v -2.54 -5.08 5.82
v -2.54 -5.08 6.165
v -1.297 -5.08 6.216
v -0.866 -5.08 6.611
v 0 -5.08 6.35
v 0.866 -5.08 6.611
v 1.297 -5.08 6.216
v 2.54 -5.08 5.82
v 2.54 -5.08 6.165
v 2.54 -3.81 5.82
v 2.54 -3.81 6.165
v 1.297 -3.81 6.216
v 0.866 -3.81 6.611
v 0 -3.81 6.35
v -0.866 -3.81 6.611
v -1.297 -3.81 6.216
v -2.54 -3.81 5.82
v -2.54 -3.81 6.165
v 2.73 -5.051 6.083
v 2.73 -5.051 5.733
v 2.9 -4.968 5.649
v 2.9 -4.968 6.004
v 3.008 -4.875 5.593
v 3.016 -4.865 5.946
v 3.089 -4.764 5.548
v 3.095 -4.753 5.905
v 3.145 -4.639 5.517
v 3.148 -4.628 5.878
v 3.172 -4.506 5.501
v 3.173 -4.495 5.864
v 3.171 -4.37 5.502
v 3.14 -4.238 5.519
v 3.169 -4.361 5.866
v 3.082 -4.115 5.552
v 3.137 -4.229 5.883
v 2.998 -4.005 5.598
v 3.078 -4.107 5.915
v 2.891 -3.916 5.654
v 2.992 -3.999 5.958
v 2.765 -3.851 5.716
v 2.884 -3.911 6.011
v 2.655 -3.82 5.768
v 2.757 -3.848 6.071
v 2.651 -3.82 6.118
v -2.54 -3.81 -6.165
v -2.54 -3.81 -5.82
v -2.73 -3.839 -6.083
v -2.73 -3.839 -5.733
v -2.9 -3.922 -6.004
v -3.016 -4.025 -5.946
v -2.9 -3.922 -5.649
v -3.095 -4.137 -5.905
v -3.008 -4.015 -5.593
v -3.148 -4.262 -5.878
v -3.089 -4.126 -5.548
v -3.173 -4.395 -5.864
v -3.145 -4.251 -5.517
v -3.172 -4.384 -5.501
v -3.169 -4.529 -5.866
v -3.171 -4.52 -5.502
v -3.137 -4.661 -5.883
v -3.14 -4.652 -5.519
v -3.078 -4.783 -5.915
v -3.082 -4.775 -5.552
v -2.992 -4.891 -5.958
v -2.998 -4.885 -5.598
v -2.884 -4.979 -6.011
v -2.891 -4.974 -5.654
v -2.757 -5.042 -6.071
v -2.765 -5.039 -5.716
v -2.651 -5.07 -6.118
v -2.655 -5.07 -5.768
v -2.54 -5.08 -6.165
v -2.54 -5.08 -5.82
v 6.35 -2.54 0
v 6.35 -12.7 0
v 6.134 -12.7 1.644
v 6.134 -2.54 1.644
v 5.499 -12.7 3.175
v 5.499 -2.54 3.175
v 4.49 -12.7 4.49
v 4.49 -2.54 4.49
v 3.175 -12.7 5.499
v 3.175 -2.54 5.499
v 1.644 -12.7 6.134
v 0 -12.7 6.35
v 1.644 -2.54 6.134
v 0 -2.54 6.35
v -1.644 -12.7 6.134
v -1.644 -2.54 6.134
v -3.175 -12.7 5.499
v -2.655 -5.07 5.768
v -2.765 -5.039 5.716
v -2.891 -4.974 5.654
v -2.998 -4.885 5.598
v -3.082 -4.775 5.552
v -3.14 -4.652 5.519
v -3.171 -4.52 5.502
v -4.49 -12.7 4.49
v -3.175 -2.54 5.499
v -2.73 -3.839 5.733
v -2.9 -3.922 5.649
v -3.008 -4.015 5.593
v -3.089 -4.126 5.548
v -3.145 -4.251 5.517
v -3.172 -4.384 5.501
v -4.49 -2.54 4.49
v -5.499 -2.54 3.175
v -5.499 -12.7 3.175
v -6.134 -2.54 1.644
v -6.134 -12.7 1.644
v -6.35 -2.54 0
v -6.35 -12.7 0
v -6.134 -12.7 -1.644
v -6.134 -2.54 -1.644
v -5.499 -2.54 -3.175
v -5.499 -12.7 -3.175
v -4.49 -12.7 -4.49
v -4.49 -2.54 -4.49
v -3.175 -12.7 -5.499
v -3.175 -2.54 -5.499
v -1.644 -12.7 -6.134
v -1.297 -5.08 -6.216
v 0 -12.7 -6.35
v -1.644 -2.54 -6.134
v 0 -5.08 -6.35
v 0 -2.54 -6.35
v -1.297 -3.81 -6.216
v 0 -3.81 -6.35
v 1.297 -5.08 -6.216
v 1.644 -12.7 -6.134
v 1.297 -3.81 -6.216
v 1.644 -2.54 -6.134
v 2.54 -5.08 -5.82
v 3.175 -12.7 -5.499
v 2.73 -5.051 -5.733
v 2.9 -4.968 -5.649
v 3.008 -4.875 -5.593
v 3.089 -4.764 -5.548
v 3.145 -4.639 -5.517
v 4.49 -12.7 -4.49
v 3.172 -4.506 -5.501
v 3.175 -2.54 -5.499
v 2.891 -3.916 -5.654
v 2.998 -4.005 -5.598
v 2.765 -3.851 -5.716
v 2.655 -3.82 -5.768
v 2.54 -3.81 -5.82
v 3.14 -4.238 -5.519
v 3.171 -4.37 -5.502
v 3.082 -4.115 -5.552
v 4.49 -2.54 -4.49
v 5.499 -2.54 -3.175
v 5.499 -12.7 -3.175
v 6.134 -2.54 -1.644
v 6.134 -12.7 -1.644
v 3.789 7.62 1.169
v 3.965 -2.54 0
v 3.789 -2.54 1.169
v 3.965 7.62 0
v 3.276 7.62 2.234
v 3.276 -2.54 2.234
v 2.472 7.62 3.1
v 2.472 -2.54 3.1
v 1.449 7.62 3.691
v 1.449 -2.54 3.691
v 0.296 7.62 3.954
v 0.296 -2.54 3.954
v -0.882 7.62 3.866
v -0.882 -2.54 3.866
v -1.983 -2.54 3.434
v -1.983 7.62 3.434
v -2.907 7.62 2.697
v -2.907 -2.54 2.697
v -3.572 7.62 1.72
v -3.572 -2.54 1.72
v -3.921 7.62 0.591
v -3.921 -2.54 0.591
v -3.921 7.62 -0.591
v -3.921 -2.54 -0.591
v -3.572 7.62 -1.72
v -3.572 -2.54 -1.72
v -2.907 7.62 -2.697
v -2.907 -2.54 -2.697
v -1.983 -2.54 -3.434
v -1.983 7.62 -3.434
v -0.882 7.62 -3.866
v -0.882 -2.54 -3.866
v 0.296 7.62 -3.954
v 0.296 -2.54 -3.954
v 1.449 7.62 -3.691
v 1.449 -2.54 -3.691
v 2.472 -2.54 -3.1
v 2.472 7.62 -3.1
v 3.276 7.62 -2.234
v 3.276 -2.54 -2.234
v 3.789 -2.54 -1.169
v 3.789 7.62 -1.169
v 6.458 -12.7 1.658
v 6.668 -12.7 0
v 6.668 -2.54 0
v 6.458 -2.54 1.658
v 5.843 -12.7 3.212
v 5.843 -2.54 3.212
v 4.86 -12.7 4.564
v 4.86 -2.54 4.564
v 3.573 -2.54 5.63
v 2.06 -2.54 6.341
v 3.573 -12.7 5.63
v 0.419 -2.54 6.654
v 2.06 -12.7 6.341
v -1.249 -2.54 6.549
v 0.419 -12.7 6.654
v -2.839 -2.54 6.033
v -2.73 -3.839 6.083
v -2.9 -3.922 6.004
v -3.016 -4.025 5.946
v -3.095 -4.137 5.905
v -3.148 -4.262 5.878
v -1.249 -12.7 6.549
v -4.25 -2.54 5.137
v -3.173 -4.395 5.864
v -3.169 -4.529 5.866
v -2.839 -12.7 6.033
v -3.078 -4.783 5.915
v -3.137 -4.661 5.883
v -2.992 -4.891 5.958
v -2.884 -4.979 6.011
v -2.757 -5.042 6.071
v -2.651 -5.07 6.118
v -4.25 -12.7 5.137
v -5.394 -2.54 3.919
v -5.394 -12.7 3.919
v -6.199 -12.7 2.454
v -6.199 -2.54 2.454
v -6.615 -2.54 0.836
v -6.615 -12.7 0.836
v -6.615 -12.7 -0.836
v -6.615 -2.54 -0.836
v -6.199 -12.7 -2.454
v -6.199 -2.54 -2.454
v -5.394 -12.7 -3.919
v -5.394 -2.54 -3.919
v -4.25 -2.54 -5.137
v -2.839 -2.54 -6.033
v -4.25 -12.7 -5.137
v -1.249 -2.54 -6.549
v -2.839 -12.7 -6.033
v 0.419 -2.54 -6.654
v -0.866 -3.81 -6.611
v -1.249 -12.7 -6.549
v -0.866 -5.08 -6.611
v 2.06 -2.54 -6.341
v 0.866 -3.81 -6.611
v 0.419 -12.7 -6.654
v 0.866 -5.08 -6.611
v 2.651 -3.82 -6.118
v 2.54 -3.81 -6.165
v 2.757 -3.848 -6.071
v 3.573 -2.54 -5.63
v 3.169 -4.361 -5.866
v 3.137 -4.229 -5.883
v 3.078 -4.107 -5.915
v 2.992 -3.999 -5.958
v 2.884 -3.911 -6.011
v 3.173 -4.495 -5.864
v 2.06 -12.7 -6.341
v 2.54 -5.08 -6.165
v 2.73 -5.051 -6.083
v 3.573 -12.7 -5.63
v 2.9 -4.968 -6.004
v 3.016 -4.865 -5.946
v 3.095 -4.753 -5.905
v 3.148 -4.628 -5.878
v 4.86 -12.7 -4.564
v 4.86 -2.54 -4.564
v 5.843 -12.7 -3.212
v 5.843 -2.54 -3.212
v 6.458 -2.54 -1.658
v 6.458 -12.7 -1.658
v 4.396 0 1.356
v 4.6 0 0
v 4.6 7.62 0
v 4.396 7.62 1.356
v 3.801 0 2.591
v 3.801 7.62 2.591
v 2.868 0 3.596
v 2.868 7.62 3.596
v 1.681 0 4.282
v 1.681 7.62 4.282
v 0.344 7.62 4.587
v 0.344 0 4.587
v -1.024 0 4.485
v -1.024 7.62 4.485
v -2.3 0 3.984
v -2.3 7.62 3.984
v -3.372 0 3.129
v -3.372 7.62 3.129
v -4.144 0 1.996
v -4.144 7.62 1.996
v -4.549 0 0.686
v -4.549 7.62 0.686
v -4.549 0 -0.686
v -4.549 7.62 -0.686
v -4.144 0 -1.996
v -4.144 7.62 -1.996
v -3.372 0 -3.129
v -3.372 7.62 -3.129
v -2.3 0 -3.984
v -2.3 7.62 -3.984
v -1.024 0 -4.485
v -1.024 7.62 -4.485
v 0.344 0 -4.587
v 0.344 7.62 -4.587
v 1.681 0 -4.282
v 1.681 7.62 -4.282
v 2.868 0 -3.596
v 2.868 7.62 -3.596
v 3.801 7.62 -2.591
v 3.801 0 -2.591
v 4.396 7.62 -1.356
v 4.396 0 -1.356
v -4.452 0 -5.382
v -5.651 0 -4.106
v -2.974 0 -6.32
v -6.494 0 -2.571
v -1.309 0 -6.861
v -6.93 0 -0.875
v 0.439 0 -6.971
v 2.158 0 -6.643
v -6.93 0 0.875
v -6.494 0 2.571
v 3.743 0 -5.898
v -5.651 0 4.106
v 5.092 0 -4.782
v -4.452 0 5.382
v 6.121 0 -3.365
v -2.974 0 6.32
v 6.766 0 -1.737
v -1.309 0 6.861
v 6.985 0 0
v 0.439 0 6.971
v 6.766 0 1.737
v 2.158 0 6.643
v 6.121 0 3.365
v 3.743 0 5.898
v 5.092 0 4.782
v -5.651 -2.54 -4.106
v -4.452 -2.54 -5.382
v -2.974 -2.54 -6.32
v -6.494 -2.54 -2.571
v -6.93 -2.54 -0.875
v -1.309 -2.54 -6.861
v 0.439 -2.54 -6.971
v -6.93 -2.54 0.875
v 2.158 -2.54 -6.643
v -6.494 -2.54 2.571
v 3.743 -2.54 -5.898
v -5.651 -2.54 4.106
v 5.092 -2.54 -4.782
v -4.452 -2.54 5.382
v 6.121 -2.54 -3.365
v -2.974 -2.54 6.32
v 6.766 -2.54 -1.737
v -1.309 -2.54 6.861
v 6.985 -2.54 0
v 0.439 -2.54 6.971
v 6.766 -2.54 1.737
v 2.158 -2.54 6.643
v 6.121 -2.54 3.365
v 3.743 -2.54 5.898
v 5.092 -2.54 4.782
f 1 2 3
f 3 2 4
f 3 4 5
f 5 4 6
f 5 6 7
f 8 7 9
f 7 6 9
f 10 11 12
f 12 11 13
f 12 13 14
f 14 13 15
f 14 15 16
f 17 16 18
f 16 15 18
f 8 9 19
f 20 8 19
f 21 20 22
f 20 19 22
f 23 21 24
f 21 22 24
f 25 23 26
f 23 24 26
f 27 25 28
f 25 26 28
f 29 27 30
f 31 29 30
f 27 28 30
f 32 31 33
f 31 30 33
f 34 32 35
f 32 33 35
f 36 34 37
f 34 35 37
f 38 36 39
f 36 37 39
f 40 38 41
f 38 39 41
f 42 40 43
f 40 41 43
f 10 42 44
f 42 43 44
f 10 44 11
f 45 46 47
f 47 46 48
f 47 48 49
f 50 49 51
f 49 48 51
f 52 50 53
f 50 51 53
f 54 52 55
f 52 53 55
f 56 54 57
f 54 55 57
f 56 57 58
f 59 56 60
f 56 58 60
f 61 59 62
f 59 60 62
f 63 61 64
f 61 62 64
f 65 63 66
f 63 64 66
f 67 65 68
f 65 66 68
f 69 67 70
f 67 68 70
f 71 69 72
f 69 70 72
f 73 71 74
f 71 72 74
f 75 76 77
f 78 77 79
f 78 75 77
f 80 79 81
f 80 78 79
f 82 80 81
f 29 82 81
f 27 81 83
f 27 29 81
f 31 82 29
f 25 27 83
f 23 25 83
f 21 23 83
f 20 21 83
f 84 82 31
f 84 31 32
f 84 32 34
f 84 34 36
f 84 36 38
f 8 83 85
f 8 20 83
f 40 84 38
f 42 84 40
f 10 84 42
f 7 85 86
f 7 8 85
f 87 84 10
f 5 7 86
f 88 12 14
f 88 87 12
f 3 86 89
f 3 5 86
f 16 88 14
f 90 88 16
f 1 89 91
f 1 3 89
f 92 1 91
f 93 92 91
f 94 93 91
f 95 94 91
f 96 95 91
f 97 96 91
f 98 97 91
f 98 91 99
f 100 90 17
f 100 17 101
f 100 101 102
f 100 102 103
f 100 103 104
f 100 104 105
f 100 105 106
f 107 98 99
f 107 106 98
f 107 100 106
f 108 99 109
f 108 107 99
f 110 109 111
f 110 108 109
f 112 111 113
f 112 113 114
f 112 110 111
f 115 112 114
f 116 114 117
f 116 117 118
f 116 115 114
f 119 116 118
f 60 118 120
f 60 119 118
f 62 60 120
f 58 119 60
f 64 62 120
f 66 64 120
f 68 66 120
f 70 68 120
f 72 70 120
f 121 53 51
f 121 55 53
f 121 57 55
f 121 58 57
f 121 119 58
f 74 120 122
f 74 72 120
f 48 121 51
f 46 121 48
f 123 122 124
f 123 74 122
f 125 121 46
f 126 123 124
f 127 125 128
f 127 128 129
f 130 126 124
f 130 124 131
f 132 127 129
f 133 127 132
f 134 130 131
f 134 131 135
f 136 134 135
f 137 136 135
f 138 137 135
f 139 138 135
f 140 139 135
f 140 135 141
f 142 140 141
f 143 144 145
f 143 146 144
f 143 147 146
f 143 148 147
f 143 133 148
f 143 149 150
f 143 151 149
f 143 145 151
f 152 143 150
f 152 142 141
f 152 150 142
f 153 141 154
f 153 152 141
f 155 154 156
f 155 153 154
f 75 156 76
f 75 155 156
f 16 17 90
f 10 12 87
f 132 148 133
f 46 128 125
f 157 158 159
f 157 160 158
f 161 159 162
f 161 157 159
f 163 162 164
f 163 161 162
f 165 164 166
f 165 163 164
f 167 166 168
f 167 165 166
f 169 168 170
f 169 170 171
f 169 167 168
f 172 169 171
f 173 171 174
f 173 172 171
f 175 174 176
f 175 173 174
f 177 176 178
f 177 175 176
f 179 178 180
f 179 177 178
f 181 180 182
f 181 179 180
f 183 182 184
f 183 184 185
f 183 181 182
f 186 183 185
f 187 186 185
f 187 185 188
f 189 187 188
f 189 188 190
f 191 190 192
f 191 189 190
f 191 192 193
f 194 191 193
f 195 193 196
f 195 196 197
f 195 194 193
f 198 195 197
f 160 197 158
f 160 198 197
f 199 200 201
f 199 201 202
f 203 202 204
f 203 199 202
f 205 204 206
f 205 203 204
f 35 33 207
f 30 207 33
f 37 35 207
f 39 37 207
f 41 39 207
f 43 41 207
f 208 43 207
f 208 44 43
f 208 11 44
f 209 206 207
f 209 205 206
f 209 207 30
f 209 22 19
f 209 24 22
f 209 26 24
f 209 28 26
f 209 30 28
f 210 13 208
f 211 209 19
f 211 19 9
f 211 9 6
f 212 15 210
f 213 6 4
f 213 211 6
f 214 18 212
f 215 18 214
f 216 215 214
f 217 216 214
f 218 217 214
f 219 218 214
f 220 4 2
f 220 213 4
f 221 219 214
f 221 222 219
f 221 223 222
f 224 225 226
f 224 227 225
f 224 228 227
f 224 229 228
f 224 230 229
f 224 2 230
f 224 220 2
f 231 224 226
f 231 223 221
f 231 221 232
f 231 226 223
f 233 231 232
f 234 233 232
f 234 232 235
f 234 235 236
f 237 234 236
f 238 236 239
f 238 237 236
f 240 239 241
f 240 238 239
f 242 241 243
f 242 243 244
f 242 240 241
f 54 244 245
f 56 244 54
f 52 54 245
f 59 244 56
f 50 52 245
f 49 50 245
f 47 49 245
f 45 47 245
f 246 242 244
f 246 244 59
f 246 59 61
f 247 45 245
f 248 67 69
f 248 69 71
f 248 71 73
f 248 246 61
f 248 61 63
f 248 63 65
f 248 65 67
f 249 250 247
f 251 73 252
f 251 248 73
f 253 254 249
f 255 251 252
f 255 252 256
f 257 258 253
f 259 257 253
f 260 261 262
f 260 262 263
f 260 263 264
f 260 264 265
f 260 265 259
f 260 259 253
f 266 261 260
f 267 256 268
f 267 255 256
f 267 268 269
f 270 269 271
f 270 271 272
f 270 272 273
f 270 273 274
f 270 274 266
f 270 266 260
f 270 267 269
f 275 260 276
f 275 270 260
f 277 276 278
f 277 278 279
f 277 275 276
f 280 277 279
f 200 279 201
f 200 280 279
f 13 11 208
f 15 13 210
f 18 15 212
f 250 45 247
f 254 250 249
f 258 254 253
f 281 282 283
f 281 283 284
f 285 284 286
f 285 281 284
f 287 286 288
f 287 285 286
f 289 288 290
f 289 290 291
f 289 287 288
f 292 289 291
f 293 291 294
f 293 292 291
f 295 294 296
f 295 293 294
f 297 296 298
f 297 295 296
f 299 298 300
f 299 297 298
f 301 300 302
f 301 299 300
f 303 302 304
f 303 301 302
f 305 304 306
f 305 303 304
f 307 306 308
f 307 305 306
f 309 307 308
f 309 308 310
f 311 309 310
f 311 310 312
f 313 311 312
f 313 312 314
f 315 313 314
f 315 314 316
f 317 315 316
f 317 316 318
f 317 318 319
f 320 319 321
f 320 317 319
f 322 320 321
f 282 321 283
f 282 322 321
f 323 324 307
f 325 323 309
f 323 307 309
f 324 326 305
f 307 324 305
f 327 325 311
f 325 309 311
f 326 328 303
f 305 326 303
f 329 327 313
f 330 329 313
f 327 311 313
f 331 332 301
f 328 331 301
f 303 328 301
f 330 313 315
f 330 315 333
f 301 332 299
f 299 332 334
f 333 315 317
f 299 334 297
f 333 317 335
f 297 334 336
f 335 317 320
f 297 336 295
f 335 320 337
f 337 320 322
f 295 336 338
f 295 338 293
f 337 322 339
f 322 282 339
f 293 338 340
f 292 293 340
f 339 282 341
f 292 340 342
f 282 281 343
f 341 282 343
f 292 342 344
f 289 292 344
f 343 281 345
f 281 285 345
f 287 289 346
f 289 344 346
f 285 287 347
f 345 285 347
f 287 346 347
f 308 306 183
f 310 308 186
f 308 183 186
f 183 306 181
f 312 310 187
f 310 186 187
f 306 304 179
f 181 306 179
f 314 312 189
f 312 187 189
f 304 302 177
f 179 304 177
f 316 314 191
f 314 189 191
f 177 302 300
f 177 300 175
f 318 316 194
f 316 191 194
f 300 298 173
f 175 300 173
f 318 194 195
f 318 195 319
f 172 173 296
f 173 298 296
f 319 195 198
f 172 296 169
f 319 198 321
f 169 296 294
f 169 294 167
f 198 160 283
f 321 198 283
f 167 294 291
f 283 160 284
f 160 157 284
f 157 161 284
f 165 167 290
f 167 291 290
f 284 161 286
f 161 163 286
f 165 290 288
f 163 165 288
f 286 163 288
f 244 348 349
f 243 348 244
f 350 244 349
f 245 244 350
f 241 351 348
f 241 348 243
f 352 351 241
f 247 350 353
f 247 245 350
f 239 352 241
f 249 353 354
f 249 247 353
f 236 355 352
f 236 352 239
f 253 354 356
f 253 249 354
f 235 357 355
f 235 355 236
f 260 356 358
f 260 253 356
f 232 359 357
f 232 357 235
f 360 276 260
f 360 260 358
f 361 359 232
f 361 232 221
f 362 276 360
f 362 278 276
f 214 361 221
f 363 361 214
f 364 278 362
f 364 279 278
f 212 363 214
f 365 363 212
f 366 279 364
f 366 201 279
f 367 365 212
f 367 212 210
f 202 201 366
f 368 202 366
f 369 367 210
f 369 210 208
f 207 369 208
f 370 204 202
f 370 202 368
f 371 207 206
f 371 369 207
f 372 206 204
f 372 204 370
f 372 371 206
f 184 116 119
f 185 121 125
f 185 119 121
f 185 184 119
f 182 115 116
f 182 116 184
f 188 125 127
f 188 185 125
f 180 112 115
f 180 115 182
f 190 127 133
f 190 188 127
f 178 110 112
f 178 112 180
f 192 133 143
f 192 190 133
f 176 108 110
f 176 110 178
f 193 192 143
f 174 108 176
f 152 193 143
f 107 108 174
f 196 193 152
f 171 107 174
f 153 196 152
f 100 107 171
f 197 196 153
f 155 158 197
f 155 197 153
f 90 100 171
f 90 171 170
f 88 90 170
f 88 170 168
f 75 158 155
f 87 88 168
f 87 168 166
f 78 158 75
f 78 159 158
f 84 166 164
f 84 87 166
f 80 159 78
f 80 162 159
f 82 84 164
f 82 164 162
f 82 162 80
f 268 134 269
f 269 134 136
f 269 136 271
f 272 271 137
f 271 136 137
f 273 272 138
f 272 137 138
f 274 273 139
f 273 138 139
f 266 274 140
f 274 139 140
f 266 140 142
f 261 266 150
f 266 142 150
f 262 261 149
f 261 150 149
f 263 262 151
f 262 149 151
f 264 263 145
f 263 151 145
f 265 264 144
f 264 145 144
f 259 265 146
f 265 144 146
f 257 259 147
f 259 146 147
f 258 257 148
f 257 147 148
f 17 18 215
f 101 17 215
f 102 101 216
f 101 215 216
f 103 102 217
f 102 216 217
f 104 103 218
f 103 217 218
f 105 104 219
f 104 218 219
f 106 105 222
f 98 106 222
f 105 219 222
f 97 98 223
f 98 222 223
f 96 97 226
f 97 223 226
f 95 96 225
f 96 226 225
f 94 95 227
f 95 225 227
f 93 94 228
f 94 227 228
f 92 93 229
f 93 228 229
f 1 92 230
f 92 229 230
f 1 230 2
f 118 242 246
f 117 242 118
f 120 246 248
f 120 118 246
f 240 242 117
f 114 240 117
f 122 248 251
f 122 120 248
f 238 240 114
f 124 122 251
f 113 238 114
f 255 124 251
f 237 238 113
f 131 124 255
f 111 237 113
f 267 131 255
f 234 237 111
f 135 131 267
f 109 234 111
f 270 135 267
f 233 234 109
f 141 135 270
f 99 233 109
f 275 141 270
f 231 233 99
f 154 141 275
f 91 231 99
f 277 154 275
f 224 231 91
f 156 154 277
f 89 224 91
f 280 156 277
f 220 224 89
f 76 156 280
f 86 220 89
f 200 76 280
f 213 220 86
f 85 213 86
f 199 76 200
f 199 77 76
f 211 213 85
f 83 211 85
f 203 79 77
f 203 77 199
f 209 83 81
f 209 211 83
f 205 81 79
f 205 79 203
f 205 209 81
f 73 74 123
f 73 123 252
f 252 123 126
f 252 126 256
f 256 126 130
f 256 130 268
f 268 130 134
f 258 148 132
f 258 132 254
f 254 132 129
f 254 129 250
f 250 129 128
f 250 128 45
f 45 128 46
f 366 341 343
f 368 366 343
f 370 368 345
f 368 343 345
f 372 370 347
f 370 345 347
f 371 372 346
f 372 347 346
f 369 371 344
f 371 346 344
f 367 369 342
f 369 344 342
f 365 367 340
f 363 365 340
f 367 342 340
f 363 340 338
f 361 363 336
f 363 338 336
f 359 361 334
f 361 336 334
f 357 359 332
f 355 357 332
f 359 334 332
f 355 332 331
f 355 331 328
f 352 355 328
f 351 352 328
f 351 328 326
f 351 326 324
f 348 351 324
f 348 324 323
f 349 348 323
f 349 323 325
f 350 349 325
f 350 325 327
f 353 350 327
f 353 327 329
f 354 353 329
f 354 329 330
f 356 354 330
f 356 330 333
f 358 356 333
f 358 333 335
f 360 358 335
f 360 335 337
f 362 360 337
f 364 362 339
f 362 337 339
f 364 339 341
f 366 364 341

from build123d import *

# Parameters (mm, degrees)
F0_R     = 4.6
F0_R_2   = 3.965
F1_DEPTH = 7.62
F0_R_3   = 6.985
F0_R_4   = 6.35
F2_DEPTH = 2.54
F3_DEPTH = 12.7
F5_R     = 6.985
F5_R_2   = 6.6675
F6_DEPTH = 10.16
F7_DEPTH = 6.82625


# Not quite as in the source:
# - a feature names something its author has since deleted; it is built from what else it names


with BuildPart() as f1:
    # F0 (on Front) → F1 (new body)
    with BuildSketch(Plane.XZ):
        Circle(F0_R)
        Circle(F0_R_2, mode=Mode.SUBTRACT)
    extrude(amount=-F1_DEPTH)

    # F0 (on Front) → F2 (join)
    with BuildSketch(Plane.XZ):
        Circle(F0_R_3)
        Circle(F0_R_4, mode=Mode.SUBTRACT)
        Circle(F0_R_4)
        Circle(F0_R, mode=Mode.SUBTRACT)
        Circle(F0_R)
        Circle(F0_R_2, mode=Mode.SUBTRACT)
    extrude(amount=F2_DEPTH)

    # F0 (on Front) → F3 (join)
    with BuildSketch(Plane.XZ):
        Circle(F0_R_3)
        Circle(F0_R_4, mode=Mode.SUBTRACT)
    extrude(amount=F3_DEPTH)

    # F5 (on face) → F6 (cut)
    with BuildSketch(Plane.XZ.offset(12.7)):
        Circle(F5_R)
        Circle(F5_R_2, mode=Mode.SUBTRACT)
    extrude(amount=-F6_DEPTH, mode=Mode.SUBTRACT)

    # F4 (on Top) → F7 (cut, symmetric)
    with BuildSketch(Plane.XY):
        with BuildLine():
            Line((2.54, -3.81), (0, -3.81))
            Line((0, -3.81), (-2.54, -3.81))
            ThreePointArc((-2.54, -3.81), (-3.175, -4.445), (-2.54, -5.08))
            Line((-2.54, -5.08), (0, -5.08))
            Line((0, -5.08), (2.54, -5.08))
            ThreePointArc((2.54, -5.08), (3.175, -4.445), (2.54, -3.81))
        make_face()
    extrude(amount=F7_DEPTH, both=True, mode=Mode.SUBTRACT)


solid = f1.part
